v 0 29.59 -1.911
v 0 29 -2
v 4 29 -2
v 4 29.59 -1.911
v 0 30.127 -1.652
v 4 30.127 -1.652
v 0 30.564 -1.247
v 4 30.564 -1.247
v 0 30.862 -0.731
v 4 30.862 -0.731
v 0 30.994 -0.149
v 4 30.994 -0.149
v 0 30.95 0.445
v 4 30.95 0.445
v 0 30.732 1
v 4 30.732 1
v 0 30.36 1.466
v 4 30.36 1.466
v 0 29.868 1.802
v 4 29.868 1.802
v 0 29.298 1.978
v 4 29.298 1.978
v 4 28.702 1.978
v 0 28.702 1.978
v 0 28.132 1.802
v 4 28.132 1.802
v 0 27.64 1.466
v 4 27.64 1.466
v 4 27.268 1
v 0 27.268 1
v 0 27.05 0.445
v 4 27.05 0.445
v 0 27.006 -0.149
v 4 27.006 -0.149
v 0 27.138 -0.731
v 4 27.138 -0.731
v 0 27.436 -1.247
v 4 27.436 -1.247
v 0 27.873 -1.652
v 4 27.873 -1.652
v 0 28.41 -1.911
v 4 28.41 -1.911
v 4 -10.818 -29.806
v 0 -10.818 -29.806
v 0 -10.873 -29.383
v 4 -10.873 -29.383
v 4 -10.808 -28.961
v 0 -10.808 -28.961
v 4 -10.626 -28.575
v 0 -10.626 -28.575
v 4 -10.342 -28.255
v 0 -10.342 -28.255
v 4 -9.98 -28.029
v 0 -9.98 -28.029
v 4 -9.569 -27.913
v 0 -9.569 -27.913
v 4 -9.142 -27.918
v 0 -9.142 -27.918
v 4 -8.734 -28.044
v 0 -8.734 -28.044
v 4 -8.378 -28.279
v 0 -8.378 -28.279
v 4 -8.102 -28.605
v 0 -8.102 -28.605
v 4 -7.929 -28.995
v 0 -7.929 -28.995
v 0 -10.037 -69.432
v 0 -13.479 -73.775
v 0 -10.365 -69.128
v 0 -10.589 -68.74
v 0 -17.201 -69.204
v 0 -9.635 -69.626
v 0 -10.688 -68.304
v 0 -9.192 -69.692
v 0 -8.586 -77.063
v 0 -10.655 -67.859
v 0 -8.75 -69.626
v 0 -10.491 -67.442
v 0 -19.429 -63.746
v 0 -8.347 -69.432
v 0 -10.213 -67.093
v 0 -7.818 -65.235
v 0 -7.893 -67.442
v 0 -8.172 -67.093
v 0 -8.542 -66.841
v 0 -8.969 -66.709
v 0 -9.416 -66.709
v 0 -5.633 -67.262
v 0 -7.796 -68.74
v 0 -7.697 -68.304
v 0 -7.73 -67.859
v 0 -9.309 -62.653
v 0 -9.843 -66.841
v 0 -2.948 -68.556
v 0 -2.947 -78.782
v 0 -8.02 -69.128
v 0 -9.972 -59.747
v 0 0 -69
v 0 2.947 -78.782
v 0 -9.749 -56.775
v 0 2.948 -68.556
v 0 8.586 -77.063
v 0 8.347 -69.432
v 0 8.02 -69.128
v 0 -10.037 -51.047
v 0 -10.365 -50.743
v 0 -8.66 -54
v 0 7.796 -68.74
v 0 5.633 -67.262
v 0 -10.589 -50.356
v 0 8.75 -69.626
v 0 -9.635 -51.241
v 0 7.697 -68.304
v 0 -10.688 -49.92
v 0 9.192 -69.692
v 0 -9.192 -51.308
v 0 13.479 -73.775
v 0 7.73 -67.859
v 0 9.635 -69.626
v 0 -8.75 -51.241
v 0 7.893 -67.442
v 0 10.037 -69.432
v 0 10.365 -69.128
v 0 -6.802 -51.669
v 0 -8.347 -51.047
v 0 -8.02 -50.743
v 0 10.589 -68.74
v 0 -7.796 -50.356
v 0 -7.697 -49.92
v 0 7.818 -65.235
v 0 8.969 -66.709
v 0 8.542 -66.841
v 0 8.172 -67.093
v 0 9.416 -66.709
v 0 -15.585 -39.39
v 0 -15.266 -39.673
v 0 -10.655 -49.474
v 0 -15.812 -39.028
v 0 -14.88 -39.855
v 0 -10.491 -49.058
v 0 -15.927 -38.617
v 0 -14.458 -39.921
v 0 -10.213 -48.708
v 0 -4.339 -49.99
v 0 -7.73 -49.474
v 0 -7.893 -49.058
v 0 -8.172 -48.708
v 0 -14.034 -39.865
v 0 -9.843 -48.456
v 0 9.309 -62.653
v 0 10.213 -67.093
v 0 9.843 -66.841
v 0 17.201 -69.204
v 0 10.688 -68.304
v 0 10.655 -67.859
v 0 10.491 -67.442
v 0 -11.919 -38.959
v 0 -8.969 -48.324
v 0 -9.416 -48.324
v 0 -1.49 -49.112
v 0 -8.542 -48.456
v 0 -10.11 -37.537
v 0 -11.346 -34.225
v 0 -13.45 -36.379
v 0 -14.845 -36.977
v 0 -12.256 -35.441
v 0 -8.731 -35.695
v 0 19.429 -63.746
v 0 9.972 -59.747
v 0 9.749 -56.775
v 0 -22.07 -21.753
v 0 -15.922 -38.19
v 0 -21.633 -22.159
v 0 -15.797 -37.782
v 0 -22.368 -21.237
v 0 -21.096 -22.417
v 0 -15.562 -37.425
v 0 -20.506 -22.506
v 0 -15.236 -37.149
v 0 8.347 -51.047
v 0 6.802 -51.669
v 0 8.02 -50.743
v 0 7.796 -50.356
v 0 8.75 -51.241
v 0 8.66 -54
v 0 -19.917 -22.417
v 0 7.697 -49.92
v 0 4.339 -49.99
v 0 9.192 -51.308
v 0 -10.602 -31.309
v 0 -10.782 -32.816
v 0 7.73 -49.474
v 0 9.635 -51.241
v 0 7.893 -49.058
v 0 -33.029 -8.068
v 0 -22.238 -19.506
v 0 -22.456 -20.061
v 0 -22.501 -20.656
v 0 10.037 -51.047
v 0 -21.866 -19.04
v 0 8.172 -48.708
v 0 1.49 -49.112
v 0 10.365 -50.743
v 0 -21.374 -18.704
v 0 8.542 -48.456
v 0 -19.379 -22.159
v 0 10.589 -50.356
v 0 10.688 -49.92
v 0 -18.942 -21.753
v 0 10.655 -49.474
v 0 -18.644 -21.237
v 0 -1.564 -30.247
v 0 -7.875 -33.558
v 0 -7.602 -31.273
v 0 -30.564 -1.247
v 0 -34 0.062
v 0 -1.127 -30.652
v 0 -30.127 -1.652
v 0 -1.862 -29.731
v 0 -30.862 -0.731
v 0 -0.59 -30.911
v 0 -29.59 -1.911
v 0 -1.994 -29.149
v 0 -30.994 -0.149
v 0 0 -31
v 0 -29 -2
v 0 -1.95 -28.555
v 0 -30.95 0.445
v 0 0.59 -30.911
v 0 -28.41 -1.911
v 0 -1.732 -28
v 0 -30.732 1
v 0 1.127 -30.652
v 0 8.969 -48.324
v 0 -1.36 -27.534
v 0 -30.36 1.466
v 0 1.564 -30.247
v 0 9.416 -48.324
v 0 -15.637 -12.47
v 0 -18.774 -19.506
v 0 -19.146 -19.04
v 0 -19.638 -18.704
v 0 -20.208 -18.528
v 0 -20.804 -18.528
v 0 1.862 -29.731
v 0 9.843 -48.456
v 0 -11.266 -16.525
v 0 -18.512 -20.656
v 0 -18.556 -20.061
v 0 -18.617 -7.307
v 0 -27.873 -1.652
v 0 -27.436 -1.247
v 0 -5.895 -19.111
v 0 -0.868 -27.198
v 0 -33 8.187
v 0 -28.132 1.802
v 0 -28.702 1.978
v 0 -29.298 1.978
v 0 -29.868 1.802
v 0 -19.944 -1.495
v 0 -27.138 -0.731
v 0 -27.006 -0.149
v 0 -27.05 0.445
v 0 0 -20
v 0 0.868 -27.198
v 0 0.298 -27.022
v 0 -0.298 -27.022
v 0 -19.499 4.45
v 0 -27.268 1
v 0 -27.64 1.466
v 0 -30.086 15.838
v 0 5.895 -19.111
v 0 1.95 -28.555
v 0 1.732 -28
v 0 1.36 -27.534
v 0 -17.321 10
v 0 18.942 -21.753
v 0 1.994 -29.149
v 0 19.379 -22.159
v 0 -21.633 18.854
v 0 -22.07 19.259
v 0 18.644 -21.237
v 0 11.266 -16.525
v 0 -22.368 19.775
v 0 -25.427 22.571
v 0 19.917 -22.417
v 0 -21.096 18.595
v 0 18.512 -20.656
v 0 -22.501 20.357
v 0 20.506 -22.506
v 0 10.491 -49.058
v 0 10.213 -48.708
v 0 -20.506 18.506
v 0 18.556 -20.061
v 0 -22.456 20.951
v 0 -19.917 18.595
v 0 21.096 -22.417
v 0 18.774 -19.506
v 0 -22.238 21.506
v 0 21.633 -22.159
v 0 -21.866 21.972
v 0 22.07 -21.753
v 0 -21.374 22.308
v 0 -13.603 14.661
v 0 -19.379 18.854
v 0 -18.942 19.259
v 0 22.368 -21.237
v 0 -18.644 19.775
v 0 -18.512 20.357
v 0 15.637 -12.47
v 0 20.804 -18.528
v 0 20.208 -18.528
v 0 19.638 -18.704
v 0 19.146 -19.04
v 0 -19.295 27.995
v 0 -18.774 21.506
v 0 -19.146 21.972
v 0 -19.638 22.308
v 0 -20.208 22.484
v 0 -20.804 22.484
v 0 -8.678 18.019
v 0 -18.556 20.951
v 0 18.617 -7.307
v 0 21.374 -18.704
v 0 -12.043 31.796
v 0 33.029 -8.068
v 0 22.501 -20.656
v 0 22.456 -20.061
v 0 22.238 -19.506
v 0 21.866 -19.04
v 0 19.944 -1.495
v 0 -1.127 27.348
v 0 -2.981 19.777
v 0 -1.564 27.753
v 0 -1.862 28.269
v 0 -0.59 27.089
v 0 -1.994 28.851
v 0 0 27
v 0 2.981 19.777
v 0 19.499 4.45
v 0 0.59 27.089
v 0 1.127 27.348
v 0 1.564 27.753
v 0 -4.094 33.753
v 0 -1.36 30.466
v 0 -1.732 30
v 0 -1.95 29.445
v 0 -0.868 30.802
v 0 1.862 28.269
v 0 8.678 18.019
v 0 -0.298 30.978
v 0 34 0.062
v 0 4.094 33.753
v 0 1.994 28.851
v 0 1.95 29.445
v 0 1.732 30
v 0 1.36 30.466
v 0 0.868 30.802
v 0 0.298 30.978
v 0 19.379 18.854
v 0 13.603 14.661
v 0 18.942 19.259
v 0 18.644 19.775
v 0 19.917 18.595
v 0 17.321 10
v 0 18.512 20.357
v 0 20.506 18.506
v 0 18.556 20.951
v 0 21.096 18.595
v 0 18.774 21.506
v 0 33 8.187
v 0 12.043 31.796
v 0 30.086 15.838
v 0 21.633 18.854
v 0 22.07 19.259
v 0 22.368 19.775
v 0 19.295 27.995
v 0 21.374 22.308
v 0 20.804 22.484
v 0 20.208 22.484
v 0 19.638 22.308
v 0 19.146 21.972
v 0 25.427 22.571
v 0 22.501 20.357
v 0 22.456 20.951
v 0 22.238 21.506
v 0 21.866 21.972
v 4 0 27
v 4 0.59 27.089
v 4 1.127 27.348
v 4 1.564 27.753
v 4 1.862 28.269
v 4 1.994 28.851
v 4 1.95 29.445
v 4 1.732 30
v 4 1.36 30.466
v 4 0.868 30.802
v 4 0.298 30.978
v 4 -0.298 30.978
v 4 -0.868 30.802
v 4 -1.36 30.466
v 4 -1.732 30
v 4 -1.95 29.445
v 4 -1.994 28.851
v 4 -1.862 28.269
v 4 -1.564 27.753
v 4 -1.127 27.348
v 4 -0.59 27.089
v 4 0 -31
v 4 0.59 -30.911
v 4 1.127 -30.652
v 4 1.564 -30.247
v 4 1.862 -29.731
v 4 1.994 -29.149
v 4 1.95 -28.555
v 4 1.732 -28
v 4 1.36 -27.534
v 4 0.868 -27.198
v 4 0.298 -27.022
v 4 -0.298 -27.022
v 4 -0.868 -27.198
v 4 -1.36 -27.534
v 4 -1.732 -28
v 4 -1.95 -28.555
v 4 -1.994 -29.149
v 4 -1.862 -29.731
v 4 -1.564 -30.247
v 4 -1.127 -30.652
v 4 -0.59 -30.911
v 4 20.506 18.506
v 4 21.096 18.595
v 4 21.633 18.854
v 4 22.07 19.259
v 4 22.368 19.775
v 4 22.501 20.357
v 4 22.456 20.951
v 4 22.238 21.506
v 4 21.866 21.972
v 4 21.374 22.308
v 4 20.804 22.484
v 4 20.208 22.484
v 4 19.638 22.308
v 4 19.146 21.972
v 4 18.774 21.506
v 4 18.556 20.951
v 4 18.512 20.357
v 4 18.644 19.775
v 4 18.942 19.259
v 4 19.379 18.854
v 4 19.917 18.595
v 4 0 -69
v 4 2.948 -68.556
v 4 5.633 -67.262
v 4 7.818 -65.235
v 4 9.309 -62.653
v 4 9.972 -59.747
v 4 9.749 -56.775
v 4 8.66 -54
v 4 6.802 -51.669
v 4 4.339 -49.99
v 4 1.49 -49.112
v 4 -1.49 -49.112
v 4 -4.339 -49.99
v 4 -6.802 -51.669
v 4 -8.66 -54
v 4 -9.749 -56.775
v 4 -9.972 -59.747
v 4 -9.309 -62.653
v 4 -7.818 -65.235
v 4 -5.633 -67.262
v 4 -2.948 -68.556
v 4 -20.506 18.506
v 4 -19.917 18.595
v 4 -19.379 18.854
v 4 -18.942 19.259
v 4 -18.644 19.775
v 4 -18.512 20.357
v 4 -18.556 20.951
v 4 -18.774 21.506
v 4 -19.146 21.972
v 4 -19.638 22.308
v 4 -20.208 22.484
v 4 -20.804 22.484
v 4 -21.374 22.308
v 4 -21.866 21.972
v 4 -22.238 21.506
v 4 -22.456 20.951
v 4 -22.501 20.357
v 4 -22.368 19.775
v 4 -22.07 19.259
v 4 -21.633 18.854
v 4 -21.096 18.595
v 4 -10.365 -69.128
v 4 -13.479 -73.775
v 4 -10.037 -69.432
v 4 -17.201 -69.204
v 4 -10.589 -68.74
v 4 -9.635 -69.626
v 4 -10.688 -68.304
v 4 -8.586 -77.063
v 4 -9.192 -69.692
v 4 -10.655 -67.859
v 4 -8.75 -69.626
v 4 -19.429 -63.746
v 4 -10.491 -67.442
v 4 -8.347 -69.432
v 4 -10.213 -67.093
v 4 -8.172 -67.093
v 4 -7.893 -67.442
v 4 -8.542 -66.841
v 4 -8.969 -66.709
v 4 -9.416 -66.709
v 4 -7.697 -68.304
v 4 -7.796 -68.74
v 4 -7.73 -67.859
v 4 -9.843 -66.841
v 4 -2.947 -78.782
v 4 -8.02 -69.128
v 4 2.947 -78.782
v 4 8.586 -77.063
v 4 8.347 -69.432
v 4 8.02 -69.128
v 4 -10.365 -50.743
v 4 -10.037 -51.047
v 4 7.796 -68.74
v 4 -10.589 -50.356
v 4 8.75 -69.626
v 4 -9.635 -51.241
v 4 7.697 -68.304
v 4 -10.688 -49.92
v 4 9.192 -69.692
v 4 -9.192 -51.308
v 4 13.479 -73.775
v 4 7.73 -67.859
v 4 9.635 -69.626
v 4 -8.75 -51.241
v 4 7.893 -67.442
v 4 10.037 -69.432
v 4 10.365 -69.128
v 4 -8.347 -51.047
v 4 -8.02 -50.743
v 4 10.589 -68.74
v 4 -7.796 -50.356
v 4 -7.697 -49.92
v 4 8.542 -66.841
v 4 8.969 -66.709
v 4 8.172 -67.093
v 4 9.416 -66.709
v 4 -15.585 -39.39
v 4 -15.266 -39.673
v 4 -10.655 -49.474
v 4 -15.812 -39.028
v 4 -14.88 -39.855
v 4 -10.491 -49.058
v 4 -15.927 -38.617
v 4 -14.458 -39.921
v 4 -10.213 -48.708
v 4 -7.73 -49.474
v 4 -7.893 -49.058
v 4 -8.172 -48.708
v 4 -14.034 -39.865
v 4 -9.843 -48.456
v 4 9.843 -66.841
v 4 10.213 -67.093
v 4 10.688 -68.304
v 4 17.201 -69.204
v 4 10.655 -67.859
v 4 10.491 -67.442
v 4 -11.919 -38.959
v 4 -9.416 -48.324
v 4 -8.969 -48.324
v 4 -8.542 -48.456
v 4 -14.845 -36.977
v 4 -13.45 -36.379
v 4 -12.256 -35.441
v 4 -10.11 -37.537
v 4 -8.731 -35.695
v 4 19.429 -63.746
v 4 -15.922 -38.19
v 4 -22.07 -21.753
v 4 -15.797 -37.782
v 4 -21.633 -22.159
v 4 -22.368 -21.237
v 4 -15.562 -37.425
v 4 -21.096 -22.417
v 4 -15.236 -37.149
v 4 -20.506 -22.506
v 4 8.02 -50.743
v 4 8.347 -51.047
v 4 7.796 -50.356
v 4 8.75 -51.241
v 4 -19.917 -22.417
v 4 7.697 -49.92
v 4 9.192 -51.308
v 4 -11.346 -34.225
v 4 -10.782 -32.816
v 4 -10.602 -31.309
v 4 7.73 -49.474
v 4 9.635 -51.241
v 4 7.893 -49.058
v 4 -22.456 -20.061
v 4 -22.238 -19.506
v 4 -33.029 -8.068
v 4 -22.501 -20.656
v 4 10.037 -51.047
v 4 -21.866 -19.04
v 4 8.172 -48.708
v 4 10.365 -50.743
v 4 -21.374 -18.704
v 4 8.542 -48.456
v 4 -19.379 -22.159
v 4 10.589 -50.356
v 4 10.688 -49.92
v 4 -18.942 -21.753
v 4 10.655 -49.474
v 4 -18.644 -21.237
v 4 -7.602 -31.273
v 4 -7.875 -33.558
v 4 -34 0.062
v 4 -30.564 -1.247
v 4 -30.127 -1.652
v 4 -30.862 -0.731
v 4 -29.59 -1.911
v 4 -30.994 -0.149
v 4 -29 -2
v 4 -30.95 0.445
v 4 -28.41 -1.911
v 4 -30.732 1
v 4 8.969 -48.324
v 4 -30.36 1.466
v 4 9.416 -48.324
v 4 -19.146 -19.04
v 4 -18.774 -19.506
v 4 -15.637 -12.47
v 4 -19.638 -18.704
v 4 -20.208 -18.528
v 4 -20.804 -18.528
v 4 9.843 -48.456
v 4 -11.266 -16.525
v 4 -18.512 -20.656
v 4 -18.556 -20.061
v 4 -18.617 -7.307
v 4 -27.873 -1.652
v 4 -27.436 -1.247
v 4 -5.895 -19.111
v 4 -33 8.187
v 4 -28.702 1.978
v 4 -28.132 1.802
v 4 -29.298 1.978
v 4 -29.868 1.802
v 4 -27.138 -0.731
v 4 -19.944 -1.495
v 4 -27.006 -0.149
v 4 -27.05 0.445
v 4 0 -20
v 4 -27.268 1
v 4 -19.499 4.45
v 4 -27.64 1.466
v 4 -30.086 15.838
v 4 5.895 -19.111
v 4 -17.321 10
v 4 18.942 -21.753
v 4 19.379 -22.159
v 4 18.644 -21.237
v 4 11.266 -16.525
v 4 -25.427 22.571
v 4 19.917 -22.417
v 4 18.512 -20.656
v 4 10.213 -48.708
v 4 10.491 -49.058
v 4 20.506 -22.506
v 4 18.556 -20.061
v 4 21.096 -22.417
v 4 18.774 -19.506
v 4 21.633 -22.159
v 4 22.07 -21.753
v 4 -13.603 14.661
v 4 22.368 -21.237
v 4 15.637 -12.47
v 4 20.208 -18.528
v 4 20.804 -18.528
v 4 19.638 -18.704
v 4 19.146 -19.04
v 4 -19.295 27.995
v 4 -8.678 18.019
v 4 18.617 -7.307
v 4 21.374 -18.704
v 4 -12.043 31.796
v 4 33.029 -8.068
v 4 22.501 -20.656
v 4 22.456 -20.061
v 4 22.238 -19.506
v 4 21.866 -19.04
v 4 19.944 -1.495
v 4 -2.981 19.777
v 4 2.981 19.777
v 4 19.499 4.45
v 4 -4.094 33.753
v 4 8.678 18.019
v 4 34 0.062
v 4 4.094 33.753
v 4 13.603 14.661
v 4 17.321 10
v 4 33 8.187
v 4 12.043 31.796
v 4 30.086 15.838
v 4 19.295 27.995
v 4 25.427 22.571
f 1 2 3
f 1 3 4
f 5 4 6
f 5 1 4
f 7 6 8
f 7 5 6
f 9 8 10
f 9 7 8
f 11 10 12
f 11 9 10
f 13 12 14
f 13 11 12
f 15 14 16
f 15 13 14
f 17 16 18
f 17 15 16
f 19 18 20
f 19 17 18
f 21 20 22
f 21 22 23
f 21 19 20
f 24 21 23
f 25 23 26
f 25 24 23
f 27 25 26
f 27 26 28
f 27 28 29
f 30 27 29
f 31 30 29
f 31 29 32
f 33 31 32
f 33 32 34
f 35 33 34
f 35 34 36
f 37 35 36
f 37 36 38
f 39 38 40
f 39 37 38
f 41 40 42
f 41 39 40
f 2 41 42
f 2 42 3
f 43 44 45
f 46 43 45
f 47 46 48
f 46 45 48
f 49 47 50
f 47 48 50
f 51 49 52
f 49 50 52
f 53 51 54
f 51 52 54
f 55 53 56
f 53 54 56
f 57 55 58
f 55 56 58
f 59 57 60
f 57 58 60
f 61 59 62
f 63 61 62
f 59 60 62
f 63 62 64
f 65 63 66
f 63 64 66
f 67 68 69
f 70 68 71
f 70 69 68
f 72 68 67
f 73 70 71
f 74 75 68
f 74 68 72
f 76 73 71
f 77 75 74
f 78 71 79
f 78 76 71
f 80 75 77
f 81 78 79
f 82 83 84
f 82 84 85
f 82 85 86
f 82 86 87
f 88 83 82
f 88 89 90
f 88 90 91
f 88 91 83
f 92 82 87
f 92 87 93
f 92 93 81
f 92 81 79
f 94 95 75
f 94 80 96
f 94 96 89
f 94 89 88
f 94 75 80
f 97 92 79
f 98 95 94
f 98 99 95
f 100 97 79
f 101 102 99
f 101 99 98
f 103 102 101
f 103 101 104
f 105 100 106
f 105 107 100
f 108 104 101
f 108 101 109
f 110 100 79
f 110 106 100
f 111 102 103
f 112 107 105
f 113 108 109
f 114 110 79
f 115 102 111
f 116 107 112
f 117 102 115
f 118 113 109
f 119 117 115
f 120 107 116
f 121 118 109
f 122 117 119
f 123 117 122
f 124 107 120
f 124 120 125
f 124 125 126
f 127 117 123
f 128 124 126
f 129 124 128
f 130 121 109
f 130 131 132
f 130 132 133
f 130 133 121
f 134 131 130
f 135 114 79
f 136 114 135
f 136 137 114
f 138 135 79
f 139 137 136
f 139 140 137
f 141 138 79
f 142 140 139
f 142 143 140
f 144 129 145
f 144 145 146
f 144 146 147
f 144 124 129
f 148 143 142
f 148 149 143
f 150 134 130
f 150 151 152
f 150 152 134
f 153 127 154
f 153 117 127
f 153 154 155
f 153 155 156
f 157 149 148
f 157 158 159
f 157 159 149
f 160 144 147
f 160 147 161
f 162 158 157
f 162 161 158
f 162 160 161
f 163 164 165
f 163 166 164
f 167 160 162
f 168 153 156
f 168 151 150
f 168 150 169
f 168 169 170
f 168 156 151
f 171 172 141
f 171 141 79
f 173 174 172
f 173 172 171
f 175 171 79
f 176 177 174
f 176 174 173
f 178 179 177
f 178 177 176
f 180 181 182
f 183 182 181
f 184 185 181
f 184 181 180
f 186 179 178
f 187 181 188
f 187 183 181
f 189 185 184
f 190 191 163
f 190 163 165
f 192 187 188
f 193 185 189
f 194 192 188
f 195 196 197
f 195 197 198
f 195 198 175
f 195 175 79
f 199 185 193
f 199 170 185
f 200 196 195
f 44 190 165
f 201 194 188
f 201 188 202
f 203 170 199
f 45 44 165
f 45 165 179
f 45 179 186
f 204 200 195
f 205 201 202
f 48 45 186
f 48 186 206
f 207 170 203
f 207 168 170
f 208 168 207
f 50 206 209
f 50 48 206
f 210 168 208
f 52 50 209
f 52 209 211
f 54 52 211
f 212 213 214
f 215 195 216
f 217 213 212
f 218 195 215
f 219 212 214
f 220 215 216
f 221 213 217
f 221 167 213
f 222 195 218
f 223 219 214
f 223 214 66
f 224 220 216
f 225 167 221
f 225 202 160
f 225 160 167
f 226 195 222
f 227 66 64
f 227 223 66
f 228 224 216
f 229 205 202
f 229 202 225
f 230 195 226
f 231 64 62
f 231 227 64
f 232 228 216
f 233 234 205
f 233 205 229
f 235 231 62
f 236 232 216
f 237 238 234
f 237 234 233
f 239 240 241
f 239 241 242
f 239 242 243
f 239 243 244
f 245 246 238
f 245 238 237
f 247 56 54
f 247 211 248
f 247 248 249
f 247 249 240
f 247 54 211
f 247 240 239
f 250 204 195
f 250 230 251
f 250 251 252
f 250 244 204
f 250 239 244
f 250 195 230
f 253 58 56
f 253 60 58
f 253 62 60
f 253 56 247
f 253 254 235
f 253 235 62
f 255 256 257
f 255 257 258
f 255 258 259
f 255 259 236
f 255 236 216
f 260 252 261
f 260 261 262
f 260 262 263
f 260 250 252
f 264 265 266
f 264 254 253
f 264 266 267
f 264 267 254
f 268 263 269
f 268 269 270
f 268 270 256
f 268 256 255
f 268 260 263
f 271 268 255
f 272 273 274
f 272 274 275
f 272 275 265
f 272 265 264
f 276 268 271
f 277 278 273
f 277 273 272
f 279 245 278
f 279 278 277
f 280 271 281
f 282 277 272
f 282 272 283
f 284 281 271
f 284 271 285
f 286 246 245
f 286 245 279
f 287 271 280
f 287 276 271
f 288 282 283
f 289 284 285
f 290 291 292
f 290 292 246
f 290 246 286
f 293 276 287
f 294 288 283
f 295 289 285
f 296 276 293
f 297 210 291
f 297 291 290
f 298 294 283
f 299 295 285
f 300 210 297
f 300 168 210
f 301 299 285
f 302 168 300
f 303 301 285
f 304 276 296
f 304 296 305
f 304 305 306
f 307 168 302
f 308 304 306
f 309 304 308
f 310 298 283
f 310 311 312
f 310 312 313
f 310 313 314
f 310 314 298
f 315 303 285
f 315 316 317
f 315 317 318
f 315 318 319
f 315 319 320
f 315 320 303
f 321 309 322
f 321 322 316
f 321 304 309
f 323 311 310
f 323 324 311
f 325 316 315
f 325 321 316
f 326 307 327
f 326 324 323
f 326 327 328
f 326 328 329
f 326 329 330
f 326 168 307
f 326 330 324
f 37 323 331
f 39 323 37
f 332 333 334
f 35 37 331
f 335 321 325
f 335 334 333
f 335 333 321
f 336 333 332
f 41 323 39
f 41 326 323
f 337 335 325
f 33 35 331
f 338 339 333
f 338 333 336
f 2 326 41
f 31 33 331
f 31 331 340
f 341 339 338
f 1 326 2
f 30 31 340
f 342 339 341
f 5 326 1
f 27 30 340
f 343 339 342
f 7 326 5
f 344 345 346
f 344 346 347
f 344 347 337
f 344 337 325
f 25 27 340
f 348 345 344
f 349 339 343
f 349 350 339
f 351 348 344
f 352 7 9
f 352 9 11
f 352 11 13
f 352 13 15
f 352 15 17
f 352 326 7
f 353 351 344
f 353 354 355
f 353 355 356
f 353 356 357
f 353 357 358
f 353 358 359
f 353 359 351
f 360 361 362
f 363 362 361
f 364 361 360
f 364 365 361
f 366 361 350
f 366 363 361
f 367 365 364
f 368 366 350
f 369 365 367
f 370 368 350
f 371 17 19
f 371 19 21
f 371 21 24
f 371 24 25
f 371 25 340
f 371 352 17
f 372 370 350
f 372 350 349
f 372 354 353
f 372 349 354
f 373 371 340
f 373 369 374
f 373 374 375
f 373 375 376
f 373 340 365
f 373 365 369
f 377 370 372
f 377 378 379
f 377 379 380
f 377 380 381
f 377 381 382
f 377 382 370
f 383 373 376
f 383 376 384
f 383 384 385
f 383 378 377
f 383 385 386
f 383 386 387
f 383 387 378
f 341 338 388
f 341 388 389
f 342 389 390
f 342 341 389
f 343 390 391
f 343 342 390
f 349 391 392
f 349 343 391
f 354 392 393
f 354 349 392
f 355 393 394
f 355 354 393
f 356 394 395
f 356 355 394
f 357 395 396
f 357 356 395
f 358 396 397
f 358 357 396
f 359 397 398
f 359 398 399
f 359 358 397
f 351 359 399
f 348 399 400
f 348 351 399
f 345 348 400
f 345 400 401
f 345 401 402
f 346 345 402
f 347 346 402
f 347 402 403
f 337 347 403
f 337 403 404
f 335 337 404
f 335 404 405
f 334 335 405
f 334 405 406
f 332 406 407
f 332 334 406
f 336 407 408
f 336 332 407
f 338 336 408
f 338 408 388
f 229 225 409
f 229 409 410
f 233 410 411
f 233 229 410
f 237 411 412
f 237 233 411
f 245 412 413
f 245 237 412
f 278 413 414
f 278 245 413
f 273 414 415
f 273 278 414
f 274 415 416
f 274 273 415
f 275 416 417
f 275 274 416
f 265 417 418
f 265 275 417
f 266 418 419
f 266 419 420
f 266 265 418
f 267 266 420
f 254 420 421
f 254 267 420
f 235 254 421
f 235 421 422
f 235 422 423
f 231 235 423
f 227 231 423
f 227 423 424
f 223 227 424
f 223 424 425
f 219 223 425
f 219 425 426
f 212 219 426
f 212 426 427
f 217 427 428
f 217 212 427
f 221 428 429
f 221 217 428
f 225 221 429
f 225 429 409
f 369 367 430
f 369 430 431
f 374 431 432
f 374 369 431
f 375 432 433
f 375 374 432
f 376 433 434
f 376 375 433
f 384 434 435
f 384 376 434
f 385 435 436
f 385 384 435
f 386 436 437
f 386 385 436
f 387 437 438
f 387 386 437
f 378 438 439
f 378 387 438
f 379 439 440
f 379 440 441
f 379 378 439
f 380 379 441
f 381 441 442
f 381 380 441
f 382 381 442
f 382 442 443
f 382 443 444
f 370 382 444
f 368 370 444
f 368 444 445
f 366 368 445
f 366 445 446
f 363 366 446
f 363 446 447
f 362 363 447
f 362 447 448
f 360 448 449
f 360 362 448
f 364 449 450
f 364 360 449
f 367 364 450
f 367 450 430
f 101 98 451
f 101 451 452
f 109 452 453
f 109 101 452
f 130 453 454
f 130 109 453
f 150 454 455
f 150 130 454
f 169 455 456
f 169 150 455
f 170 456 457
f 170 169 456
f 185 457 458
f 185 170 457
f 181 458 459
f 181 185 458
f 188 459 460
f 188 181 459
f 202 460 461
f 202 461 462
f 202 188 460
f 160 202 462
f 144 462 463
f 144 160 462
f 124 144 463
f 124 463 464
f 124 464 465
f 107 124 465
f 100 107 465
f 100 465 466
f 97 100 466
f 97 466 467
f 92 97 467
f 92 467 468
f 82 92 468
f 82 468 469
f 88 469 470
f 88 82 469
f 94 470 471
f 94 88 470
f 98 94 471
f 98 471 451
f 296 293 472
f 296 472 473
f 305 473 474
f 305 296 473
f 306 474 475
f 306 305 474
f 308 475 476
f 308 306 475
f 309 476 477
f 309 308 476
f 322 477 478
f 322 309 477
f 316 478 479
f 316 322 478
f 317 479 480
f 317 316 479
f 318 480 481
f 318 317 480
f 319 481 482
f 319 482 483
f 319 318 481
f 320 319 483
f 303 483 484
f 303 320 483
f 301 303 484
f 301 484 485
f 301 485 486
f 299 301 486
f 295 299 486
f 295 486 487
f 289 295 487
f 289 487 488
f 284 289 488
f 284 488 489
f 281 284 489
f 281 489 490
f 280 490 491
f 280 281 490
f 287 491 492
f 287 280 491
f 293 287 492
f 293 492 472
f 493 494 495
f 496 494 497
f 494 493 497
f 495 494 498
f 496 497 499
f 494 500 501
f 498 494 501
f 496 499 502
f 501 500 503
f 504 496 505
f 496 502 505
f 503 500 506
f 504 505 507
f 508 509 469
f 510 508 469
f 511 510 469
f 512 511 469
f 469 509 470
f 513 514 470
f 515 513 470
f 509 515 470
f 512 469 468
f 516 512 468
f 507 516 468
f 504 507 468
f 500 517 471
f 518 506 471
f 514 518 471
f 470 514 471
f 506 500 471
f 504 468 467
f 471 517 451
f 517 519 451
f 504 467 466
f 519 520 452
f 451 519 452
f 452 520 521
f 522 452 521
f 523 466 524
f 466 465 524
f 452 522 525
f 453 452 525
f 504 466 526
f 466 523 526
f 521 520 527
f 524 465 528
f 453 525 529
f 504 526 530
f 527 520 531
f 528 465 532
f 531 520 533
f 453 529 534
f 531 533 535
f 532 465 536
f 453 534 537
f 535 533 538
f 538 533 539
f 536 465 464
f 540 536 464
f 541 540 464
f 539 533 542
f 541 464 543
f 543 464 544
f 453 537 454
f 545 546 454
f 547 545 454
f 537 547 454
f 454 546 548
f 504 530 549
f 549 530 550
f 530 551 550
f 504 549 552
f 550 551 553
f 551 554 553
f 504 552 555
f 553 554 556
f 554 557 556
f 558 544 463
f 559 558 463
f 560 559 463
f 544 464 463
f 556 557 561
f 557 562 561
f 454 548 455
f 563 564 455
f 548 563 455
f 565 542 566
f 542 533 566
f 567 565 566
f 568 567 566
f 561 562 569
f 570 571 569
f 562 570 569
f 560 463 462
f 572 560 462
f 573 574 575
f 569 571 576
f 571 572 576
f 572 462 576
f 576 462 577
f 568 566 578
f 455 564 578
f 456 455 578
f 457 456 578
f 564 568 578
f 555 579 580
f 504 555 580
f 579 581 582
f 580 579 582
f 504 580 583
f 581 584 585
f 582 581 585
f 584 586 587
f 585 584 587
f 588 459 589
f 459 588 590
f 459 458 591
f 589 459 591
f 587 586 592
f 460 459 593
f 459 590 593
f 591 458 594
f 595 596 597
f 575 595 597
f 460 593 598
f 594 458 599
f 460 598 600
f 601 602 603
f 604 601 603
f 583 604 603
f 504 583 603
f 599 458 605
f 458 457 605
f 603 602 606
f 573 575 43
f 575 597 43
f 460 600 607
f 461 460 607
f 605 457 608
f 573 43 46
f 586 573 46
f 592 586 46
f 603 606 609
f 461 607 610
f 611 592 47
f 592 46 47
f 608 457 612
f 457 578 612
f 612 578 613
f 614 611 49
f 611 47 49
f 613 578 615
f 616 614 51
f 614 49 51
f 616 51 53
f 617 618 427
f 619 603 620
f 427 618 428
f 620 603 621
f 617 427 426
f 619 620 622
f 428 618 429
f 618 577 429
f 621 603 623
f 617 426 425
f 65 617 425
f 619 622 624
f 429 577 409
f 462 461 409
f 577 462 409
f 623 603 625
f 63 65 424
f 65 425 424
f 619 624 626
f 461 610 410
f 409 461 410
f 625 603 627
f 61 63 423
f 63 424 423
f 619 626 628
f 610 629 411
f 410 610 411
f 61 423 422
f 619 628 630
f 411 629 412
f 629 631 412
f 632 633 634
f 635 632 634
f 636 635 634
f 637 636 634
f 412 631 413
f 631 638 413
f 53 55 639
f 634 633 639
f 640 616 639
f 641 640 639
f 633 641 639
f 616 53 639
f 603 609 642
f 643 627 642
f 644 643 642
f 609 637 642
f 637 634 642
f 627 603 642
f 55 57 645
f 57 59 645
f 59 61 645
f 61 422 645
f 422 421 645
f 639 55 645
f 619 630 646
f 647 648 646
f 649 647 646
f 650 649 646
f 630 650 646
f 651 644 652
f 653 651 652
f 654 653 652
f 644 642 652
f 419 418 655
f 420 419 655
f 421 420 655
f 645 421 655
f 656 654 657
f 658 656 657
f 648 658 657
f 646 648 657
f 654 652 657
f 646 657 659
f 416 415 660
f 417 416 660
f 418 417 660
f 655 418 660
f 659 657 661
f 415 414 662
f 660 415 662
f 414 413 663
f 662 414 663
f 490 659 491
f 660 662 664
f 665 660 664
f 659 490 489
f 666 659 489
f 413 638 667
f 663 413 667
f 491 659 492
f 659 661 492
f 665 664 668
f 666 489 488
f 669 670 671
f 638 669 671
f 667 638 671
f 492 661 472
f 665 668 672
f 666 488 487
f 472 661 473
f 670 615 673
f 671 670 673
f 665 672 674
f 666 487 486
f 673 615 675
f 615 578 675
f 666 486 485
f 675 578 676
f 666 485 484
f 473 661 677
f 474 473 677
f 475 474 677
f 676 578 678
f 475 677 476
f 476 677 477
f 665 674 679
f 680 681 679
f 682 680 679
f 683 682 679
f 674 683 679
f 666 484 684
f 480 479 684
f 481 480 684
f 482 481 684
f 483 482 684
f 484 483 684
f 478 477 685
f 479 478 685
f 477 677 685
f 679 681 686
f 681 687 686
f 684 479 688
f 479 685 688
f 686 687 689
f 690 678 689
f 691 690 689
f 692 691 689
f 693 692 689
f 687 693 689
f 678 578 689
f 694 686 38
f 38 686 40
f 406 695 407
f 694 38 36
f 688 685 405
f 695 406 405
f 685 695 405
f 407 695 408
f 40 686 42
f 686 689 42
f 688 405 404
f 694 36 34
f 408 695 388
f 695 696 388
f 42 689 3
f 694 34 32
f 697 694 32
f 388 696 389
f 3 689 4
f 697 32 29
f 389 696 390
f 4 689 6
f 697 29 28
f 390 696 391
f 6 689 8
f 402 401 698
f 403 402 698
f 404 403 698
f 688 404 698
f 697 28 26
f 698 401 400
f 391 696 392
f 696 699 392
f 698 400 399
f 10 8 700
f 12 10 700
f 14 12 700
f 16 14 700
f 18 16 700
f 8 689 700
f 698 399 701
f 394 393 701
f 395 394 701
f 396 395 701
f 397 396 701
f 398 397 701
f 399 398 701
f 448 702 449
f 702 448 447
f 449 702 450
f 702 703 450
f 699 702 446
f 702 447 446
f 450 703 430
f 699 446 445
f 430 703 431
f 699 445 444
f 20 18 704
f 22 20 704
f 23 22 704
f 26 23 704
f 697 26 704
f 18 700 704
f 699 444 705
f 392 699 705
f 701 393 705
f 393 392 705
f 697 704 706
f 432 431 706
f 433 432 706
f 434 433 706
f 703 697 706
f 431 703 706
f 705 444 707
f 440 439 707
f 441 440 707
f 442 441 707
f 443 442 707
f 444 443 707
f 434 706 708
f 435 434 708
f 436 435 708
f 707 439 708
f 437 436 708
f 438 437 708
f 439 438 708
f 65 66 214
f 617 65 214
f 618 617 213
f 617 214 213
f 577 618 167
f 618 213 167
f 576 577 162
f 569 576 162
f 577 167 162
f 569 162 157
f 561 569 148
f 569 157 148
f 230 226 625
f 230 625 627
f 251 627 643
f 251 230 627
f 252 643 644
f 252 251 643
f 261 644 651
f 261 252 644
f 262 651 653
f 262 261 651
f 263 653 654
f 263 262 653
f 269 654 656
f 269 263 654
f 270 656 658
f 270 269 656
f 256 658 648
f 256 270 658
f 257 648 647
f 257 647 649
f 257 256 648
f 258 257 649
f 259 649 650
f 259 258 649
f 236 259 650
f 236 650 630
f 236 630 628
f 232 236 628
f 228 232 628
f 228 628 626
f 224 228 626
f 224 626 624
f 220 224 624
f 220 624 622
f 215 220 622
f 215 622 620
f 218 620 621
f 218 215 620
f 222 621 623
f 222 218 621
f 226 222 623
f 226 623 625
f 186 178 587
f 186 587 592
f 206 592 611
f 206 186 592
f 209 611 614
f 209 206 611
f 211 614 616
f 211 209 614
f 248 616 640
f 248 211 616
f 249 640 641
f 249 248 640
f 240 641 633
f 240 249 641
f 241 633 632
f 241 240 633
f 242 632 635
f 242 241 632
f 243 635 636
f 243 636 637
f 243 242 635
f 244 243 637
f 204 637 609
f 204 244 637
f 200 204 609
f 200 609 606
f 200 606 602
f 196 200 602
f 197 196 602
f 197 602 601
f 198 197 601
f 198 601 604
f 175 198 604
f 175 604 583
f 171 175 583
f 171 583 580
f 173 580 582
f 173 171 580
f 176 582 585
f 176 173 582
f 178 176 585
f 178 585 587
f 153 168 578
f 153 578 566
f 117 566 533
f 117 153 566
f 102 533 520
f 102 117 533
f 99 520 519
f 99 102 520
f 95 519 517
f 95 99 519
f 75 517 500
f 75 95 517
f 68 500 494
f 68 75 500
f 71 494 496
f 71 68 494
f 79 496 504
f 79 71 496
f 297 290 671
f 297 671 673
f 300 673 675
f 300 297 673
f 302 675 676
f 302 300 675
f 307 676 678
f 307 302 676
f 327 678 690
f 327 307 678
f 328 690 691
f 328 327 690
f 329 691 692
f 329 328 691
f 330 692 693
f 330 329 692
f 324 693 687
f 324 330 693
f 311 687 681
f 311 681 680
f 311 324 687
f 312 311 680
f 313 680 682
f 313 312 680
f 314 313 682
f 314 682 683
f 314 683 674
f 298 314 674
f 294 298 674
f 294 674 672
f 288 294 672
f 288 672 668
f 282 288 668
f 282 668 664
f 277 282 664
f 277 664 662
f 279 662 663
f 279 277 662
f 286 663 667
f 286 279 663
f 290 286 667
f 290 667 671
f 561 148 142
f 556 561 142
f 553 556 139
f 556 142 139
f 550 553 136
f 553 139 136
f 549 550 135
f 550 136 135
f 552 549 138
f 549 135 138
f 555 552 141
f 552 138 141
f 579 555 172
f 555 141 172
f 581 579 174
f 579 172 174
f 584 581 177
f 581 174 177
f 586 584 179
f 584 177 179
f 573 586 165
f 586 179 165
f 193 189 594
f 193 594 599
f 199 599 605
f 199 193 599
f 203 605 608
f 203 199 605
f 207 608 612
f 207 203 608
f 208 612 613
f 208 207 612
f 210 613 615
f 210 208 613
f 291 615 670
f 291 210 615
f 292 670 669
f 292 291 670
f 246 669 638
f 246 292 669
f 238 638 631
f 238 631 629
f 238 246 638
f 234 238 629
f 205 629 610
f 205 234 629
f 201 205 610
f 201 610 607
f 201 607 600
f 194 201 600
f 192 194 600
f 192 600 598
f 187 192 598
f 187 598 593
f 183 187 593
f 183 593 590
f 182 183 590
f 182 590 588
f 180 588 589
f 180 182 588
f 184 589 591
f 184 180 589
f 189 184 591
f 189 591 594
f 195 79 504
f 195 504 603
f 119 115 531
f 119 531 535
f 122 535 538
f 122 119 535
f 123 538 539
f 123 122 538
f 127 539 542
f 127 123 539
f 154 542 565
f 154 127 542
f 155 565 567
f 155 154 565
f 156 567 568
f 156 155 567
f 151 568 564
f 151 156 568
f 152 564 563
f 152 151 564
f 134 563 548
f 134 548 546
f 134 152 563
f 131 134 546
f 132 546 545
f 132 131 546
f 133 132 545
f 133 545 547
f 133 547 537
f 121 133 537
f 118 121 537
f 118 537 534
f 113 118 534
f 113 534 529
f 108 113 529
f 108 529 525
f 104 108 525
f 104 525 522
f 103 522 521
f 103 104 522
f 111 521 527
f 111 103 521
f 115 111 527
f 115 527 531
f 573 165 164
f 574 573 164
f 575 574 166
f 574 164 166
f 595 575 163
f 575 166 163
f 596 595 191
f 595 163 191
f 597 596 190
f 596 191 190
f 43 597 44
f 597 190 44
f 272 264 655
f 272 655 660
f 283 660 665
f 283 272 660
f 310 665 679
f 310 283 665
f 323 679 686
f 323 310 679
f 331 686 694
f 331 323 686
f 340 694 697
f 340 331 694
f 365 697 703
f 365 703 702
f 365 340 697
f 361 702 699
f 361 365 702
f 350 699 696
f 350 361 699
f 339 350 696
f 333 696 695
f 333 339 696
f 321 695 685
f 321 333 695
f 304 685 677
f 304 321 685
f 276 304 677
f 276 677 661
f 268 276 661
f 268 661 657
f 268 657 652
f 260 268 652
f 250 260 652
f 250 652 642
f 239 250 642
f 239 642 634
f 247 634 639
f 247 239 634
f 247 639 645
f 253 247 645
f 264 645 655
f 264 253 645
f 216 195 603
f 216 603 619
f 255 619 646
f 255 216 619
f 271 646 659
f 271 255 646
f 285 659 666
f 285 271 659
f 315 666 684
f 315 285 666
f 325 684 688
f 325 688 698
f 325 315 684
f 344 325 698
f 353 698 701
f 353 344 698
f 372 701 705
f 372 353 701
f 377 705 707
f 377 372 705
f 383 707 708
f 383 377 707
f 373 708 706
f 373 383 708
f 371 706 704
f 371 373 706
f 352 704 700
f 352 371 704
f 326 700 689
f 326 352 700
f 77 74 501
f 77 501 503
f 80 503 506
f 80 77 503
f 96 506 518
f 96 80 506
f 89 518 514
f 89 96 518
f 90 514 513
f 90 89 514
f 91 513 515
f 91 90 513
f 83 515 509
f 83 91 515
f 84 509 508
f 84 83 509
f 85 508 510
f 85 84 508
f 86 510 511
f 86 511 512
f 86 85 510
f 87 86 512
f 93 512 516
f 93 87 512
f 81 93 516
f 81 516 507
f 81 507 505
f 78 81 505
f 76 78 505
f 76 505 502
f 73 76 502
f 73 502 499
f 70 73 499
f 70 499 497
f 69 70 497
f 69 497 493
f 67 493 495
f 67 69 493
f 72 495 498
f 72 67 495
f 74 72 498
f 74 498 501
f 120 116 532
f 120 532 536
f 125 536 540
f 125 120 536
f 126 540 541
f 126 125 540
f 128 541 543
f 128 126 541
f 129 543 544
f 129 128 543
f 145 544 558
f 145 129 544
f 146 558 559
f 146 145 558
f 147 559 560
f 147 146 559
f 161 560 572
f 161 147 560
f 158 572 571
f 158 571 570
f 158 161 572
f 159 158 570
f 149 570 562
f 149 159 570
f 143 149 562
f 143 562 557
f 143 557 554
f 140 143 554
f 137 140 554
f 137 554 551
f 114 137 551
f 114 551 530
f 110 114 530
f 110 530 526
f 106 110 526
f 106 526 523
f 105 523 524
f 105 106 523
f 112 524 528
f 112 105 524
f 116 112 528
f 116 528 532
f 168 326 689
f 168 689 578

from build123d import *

# Parameters (mm, degrees)
SKETCH1_R           = 10
SKETCH1_R_2         = 20
SKETCH1_R_3         = 2
SKETCH1_R_4         = 1.5
BOSS_EXTRUDE1_DEPTH = 4
CUT_EXTRUDE1_DEPTH  = 10


with BuildPart() as part:
    # Sketch1 → Boss-Extrude1 (new body)
    with BuildSketch(Plane(origin=(0, 0, 0), x_dir=(0, 0, -1), z_dir=(1, 0, 0))):
        with BuildLine():
            Line((8.06779661, 33.028936675), (63.745762712, 19.428786279))
            ThreePointArc((63.745762712, 19.428786279), (79, 0), (63.745762712, -19.428786279))
            Line((63.745762712, -19.428786279), (8.06779661, -33.028936675))
            ThreePointArc((8.06779661, -33.028936675), (-34, 0), (8.06779661, 33.028936675))
        make_face()
        with Locations((59, 0)):
            Circle(SKETCH1_R, mode=Mode.SUBTRACT)
        Circle(SKETCH1_R_2, mode=Mode.SUBTRACT)
        with Locations((0, 29)):
            Circle(SKETCH1_R_3, mode=Mode.SUBTRACT)
        with Locations((20.506096654, 20.506096654)):
            Circle(SKETCH1_R_3, mode=Mode.SUBTRACT)
        with Locations((29, 0)):
            Circle(SKETCH1_R_3, mode=Mode.SUBTRACT)
        with Locations((20.506096654, -20.506096654)):
            Circle(SKETCH1_R_3, mode=Mode.SUBTRACT)
        with Locations((0, -29)):
            Circle(SKETCH1_R_3, mode=Mode.SUBTRACT)
        with Locations((-20.506096654, -20.506096654)):
            Circle(SKETCH1_R_3, mode=Mode.SUBTRACT)
        with Locations((-29, 0)):
            Circle(SKETCH1_R_3, mode=Mode.SUBTRACT)
        with Locations((-20.506096654, 20.506096654)):
            Circle(SKETCH1_R_3, mode=Mode.SUBTRACT)
        with Locations((49.807611845, 9.192388155)):
            Circle(SKETCH1_R_4, mode=Mode.SUBTRACT)
        with Locations((68.192388155, 9.192388155)):
            Circle(SKETCH1_R_4, mode=Mode.SUBTRACT)
        with Locations((68.192388155, -9.192388155)):
            Circle(SKETCH1_R_4, mode=Mode.SUBTRACT)
        with Locations((49.807611845, -9.192388155)):
            Circle(SKETCH1_R_4, mode=Mode.SUBTRACT)
    extrude(amount=BOSS_EXTRUDE1_DEPTH)

    # Sketch2 → Cut-Extrude1 (cut)
    with BuildSketch(Plane.ZY):
        with BuildLine():
            ThreePointArc((-28.995147078, -7.929410218), (-35.694510355, -8.730689231), (-39.865085734, -14.034444257))
            ThreePointArc((-39.865085734, -14.034444257), (-38.826287735, -15.884011427), (-36.976720565, -14.845213428))
            ThreePointArc((-36.976720565, -14.845213428), (-34.225428136, -11.346372207), (-29.805916249, -10.817775387))
            ThreePointArc((-29.805916249, -10.817775387), (-27.956349079, -9.778977388), (-28.995147078, -7.929410218))
        make_face()
    extrude(amount=-CUT_EXTRUDE1_DEPTH, mode=Mode.SUBTRACT)


solid = part.part
